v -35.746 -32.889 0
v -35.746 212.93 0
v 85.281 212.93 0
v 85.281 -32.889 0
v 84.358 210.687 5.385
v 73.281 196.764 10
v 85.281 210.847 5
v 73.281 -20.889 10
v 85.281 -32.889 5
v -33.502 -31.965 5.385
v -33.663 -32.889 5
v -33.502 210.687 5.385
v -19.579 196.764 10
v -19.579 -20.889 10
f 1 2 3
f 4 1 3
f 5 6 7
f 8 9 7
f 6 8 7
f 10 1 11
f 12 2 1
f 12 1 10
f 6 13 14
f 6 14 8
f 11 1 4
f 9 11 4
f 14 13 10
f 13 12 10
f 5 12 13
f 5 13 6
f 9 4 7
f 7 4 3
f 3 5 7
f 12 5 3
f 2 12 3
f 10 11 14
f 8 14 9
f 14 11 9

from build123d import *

# Parameters (mm, degrees)
F0_W        = 121.859960258
F0_H        = 246.6522753239
F1_DEPTH    = 10
F2_SIZE2    = 5
F2_SIZE     = 12
F3_SIZE2    = 5
F3_SIZE     = 12
F4_T1_DEPTH = 172.0821922482
F5_T1_DEPTH = 291.8745073141
F6_SIZE2    = 5
F6_SIZE     = 12
F7_SIZE2    = 5
F7_SIZE     = 12


# Not quite as in the source:
# - a fillet or chamfer that OpenCascade refuses, or shapes differently, is made with other operations: its cross-section is extruded or revolved along the edge and cut away or added


with BuildPart() as f1:
    # F0 (on Top) → F1 (new body)
    with BuildSketch(Plane.XY):
        with Locations((24.3507884443, 90.4376059771)):
            Rectangle(F0_W, F0_H)
    extrude(amount=F1_DEPTH)

    # F2
    f2_edges = [f1.edges().sort_by_distance(p)[0] for p in [
        (85.280769, 90.437606, 10),
    ]]
    f2_side = f1.faces().sort_by_distance((24.350788, 90.437606, 10))[0]
    chamfer(f2_edges, length=F2_SIZE, length2=F2_SIZE2, reference=f2_side)

    # F3
    f3_edges = [f1.edges().sort_by_distance(p)[0] for p in [
        (18.350788, -32.888532, 10),
    ]]
    f3_side = f1.faces().sort_by_distance((18.350788, 90.437606, 10))[0]
    chamfer(f3_edges, length=F3_SIZE, length2=F3_SIZE2, reference=f3_side)

    # F4: chamfer of 12 x 5 on 1 edges, made by hand

    # F4_s2 → F4_t1 (cut)
    with BuildSketch(Plane.YZ.offset(-67.6903076798)):
        Polygon((208.763743639, 10), (213.763743639, -2), (213.763743639, 10), align=None)
    extrude(amount=F4_T1_DEPTH, mode=Mode.SUBTRACT)

    # F5: chamfer of 12 x 5 on 1 edges, made by hand

    # F5_s2 → F5_t1 (cut)
    with BuildSketch(Plane.XZ.offset(-239.8748596341)):
        Polygon((-36.5791916847, -2), (-31.5791916847, 10), (-36.5791916847, 10), align=None)
    extrude(amount=F5_T1_DEPTH, mode=Mode.SUBTRACT)

    # F6
    f6_edges = [f1.edges().sort_by_distance(p)[0] for p in [
        (-31.579192, 93.937606, 10),
    ]]
    f6_side = f1.faces().sort_by_distance((20.850788, 93.937606, 10))[0]
    chamfer(f6_edges, length=F6_SIZE, length2=F6_SIZE2, reference=f6_side)

    # F7
    f7_edges = [f1.edges().sort_by_distance(p)[0] for p in [
        (26.850788, 208.763744, 10),
    ]]
    f7_side = f1.faces().sort_by_distance((26.850788, 93.937606, 10))[0]
    chamfer(f7_edges, length=F7_SIZE, length2=F7_SIZE2, reference=f7_side)


solid = f1.part
